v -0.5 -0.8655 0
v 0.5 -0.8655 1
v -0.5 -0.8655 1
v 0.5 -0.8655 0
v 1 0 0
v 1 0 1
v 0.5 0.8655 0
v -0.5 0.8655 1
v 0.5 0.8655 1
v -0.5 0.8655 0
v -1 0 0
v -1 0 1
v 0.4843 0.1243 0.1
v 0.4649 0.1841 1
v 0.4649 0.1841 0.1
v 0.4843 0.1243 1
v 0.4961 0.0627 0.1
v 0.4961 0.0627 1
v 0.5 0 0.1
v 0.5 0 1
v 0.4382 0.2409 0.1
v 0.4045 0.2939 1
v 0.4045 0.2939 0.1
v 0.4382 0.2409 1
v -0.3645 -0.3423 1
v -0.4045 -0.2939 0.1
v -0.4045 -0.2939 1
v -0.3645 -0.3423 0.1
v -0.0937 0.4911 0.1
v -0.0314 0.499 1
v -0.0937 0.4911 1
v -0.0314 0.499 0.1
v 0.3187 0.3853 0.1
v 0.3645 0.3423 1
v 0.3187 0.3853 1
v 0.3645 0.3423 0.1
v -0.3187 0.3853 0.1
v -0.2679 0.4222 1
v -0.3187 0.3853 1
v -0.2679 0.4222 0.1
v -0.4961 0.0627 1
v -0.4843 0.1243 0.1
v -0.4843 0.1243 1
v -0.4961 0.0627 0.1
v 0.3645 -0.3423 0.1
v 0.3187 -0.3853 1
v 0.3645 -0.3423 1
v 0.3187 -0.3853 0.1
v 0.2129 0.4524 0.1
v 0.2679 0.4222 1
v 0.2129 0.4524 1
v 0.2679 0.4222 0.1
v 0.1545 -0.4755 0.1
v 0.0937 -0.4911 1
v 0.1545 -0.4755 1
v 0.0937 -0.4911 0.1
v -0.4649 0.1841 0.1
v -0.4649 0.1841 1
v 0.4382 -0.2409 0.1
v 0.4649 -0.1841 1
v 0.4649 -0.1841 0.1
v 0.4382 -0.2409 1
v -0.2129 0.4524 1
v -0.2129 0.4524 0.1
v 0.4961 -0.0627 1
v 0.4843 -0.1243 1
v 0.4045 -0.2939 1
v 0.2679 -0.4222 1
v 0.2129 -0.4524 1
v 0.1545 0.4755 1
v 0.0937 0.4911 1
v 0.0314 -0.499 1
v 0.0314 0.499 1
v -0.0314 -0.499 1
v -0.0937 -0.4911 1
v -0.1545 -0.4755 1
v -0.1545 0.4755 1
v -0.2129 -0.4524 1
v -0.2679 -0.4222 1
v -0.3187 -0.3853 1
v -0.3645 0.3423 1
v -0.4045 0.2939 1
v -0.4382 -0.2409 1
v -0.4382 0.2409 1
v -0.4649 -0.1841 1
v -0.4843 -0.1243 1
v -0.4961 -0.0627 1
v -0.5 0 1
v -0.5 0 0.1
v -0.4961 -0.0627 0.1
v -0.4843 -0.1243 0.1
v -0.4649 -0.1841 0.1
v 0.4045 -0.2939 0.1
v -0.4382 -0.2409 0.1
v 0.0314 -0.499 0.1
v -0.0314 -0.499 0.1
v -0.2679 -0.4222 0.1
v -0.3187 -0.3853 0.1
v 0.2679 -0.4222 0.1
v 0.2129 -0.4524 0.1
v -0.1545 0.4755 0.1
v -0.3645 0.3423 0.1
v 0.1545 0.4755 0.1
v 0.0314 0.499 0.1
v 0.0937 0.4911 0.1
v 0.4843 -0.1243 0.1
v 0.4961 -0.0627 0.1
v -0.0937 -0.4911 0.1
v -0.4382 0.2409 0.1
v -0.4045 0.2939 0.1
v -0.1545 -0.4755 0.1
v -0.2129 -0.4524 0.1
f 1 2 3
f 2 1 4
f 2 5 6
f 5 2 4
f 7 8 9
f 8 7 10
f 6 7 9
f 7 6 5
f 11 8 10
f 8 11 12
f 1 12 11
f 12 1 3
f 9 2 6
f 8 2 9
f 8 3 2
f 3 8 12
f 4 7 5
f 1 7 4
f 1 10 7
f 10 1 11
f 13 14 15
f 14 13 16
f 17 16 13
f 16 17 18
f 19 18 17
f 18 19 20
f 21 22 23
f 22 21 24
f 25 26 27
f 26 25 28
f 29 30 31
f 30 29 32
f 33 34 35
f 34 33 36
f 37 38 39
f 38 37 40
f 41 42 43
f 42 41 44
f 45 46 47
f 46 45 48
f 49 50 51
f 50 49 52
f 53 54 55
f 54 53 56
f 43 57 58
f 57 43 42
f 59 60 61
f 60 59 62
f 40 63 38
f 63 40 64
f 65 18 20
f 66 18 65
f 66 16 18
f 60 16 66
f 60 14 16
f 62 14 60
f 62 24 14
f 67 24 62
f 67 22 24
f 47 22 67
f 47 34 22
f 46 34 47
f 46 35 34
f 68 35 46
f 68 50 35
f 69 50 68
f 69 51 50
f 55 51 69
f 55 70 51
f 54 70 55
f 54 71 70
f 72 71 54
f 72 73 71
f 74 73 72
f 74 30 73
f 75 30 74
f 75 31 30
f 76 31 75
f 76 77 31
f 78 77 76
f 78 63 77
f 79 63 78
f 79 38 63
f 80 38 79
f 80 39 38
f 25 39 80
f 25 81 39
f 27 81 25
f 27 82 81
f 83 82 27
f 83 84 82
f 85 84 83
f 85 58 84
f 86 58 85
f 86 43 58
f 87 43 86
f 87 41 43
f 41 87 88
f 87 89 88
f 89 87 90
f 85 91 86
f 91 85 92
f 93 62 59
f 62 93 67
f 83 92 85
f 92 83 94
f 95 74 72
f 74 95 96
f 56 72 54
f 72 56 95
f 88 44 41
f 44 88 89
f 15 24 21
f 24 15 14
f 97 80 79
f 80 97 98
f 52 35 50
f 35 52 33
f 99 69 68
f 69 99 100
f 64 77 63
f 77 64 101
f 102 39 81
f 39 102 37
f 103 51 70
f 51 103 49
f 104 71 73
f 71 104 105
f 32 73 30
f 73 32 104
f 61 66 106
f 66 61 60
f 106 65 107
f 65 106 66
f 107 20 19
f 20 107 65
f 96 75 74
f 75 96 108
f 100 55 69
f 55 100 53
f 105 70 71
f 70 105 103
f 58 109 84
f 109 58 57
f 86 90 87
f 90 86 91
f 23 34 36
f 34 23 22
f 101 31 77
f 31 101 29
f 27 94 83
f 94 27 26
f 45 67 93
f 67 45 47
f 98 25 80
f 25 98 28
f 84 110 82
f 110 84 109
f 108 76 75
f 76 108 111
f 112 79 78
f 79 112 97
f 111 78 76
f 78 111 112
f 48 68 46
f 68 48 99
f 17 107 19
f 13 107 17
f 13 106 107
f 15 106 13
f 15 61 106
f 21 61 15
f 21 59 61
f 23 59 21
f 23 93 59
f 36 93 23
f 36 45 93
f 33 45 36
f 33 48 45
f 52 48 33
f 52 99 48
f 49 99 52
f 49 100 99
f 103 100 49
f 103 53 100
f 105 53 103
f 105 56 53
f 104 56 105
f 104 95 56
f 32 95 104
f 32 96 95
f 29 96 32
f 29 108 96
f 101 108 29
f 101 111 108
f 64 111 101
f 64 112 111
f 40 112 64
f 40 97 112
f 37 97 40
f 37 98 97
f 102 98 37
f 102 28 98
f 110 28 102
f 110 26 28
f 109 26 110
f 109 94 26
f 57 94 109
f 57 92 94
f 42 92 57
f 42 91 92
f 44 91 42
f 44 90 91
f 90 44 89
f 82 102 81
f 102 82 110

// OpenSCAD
difference() {
  translate([0.0000000000, 0.0000000000, 0.5000000000]) {
    scale([2.0000000000, 1.7320000000, 1.0000000000]) {
      rotate([0.0000000000, 0.0000000000, -0.0000000000]) {
        scale([0.5, 0.577, 1]) cylinder($fn = 6, center = true);
      }
    }
  }
  translate([0.0000000000, 0.0000000000, 0.5499997000]) {
    rotate([0.0000000000, 0.0000000000, 0.0000000000]) {
      scale([1.0000000000, 0.9980000000, 0.9000000000]) {
        translate([-0.0000000000, -0.0000000000, -0.0000000000]) {
          scale([1.0000000000, 1.0020040080, 1.0000000000]) {
            rotate([0.0000000000, 0.0000000000, -0.0000000000]) {
              cylinder($fn = 50, center = true, r = 0.5);
            }
          }
        }
      }
    }
  }
}
